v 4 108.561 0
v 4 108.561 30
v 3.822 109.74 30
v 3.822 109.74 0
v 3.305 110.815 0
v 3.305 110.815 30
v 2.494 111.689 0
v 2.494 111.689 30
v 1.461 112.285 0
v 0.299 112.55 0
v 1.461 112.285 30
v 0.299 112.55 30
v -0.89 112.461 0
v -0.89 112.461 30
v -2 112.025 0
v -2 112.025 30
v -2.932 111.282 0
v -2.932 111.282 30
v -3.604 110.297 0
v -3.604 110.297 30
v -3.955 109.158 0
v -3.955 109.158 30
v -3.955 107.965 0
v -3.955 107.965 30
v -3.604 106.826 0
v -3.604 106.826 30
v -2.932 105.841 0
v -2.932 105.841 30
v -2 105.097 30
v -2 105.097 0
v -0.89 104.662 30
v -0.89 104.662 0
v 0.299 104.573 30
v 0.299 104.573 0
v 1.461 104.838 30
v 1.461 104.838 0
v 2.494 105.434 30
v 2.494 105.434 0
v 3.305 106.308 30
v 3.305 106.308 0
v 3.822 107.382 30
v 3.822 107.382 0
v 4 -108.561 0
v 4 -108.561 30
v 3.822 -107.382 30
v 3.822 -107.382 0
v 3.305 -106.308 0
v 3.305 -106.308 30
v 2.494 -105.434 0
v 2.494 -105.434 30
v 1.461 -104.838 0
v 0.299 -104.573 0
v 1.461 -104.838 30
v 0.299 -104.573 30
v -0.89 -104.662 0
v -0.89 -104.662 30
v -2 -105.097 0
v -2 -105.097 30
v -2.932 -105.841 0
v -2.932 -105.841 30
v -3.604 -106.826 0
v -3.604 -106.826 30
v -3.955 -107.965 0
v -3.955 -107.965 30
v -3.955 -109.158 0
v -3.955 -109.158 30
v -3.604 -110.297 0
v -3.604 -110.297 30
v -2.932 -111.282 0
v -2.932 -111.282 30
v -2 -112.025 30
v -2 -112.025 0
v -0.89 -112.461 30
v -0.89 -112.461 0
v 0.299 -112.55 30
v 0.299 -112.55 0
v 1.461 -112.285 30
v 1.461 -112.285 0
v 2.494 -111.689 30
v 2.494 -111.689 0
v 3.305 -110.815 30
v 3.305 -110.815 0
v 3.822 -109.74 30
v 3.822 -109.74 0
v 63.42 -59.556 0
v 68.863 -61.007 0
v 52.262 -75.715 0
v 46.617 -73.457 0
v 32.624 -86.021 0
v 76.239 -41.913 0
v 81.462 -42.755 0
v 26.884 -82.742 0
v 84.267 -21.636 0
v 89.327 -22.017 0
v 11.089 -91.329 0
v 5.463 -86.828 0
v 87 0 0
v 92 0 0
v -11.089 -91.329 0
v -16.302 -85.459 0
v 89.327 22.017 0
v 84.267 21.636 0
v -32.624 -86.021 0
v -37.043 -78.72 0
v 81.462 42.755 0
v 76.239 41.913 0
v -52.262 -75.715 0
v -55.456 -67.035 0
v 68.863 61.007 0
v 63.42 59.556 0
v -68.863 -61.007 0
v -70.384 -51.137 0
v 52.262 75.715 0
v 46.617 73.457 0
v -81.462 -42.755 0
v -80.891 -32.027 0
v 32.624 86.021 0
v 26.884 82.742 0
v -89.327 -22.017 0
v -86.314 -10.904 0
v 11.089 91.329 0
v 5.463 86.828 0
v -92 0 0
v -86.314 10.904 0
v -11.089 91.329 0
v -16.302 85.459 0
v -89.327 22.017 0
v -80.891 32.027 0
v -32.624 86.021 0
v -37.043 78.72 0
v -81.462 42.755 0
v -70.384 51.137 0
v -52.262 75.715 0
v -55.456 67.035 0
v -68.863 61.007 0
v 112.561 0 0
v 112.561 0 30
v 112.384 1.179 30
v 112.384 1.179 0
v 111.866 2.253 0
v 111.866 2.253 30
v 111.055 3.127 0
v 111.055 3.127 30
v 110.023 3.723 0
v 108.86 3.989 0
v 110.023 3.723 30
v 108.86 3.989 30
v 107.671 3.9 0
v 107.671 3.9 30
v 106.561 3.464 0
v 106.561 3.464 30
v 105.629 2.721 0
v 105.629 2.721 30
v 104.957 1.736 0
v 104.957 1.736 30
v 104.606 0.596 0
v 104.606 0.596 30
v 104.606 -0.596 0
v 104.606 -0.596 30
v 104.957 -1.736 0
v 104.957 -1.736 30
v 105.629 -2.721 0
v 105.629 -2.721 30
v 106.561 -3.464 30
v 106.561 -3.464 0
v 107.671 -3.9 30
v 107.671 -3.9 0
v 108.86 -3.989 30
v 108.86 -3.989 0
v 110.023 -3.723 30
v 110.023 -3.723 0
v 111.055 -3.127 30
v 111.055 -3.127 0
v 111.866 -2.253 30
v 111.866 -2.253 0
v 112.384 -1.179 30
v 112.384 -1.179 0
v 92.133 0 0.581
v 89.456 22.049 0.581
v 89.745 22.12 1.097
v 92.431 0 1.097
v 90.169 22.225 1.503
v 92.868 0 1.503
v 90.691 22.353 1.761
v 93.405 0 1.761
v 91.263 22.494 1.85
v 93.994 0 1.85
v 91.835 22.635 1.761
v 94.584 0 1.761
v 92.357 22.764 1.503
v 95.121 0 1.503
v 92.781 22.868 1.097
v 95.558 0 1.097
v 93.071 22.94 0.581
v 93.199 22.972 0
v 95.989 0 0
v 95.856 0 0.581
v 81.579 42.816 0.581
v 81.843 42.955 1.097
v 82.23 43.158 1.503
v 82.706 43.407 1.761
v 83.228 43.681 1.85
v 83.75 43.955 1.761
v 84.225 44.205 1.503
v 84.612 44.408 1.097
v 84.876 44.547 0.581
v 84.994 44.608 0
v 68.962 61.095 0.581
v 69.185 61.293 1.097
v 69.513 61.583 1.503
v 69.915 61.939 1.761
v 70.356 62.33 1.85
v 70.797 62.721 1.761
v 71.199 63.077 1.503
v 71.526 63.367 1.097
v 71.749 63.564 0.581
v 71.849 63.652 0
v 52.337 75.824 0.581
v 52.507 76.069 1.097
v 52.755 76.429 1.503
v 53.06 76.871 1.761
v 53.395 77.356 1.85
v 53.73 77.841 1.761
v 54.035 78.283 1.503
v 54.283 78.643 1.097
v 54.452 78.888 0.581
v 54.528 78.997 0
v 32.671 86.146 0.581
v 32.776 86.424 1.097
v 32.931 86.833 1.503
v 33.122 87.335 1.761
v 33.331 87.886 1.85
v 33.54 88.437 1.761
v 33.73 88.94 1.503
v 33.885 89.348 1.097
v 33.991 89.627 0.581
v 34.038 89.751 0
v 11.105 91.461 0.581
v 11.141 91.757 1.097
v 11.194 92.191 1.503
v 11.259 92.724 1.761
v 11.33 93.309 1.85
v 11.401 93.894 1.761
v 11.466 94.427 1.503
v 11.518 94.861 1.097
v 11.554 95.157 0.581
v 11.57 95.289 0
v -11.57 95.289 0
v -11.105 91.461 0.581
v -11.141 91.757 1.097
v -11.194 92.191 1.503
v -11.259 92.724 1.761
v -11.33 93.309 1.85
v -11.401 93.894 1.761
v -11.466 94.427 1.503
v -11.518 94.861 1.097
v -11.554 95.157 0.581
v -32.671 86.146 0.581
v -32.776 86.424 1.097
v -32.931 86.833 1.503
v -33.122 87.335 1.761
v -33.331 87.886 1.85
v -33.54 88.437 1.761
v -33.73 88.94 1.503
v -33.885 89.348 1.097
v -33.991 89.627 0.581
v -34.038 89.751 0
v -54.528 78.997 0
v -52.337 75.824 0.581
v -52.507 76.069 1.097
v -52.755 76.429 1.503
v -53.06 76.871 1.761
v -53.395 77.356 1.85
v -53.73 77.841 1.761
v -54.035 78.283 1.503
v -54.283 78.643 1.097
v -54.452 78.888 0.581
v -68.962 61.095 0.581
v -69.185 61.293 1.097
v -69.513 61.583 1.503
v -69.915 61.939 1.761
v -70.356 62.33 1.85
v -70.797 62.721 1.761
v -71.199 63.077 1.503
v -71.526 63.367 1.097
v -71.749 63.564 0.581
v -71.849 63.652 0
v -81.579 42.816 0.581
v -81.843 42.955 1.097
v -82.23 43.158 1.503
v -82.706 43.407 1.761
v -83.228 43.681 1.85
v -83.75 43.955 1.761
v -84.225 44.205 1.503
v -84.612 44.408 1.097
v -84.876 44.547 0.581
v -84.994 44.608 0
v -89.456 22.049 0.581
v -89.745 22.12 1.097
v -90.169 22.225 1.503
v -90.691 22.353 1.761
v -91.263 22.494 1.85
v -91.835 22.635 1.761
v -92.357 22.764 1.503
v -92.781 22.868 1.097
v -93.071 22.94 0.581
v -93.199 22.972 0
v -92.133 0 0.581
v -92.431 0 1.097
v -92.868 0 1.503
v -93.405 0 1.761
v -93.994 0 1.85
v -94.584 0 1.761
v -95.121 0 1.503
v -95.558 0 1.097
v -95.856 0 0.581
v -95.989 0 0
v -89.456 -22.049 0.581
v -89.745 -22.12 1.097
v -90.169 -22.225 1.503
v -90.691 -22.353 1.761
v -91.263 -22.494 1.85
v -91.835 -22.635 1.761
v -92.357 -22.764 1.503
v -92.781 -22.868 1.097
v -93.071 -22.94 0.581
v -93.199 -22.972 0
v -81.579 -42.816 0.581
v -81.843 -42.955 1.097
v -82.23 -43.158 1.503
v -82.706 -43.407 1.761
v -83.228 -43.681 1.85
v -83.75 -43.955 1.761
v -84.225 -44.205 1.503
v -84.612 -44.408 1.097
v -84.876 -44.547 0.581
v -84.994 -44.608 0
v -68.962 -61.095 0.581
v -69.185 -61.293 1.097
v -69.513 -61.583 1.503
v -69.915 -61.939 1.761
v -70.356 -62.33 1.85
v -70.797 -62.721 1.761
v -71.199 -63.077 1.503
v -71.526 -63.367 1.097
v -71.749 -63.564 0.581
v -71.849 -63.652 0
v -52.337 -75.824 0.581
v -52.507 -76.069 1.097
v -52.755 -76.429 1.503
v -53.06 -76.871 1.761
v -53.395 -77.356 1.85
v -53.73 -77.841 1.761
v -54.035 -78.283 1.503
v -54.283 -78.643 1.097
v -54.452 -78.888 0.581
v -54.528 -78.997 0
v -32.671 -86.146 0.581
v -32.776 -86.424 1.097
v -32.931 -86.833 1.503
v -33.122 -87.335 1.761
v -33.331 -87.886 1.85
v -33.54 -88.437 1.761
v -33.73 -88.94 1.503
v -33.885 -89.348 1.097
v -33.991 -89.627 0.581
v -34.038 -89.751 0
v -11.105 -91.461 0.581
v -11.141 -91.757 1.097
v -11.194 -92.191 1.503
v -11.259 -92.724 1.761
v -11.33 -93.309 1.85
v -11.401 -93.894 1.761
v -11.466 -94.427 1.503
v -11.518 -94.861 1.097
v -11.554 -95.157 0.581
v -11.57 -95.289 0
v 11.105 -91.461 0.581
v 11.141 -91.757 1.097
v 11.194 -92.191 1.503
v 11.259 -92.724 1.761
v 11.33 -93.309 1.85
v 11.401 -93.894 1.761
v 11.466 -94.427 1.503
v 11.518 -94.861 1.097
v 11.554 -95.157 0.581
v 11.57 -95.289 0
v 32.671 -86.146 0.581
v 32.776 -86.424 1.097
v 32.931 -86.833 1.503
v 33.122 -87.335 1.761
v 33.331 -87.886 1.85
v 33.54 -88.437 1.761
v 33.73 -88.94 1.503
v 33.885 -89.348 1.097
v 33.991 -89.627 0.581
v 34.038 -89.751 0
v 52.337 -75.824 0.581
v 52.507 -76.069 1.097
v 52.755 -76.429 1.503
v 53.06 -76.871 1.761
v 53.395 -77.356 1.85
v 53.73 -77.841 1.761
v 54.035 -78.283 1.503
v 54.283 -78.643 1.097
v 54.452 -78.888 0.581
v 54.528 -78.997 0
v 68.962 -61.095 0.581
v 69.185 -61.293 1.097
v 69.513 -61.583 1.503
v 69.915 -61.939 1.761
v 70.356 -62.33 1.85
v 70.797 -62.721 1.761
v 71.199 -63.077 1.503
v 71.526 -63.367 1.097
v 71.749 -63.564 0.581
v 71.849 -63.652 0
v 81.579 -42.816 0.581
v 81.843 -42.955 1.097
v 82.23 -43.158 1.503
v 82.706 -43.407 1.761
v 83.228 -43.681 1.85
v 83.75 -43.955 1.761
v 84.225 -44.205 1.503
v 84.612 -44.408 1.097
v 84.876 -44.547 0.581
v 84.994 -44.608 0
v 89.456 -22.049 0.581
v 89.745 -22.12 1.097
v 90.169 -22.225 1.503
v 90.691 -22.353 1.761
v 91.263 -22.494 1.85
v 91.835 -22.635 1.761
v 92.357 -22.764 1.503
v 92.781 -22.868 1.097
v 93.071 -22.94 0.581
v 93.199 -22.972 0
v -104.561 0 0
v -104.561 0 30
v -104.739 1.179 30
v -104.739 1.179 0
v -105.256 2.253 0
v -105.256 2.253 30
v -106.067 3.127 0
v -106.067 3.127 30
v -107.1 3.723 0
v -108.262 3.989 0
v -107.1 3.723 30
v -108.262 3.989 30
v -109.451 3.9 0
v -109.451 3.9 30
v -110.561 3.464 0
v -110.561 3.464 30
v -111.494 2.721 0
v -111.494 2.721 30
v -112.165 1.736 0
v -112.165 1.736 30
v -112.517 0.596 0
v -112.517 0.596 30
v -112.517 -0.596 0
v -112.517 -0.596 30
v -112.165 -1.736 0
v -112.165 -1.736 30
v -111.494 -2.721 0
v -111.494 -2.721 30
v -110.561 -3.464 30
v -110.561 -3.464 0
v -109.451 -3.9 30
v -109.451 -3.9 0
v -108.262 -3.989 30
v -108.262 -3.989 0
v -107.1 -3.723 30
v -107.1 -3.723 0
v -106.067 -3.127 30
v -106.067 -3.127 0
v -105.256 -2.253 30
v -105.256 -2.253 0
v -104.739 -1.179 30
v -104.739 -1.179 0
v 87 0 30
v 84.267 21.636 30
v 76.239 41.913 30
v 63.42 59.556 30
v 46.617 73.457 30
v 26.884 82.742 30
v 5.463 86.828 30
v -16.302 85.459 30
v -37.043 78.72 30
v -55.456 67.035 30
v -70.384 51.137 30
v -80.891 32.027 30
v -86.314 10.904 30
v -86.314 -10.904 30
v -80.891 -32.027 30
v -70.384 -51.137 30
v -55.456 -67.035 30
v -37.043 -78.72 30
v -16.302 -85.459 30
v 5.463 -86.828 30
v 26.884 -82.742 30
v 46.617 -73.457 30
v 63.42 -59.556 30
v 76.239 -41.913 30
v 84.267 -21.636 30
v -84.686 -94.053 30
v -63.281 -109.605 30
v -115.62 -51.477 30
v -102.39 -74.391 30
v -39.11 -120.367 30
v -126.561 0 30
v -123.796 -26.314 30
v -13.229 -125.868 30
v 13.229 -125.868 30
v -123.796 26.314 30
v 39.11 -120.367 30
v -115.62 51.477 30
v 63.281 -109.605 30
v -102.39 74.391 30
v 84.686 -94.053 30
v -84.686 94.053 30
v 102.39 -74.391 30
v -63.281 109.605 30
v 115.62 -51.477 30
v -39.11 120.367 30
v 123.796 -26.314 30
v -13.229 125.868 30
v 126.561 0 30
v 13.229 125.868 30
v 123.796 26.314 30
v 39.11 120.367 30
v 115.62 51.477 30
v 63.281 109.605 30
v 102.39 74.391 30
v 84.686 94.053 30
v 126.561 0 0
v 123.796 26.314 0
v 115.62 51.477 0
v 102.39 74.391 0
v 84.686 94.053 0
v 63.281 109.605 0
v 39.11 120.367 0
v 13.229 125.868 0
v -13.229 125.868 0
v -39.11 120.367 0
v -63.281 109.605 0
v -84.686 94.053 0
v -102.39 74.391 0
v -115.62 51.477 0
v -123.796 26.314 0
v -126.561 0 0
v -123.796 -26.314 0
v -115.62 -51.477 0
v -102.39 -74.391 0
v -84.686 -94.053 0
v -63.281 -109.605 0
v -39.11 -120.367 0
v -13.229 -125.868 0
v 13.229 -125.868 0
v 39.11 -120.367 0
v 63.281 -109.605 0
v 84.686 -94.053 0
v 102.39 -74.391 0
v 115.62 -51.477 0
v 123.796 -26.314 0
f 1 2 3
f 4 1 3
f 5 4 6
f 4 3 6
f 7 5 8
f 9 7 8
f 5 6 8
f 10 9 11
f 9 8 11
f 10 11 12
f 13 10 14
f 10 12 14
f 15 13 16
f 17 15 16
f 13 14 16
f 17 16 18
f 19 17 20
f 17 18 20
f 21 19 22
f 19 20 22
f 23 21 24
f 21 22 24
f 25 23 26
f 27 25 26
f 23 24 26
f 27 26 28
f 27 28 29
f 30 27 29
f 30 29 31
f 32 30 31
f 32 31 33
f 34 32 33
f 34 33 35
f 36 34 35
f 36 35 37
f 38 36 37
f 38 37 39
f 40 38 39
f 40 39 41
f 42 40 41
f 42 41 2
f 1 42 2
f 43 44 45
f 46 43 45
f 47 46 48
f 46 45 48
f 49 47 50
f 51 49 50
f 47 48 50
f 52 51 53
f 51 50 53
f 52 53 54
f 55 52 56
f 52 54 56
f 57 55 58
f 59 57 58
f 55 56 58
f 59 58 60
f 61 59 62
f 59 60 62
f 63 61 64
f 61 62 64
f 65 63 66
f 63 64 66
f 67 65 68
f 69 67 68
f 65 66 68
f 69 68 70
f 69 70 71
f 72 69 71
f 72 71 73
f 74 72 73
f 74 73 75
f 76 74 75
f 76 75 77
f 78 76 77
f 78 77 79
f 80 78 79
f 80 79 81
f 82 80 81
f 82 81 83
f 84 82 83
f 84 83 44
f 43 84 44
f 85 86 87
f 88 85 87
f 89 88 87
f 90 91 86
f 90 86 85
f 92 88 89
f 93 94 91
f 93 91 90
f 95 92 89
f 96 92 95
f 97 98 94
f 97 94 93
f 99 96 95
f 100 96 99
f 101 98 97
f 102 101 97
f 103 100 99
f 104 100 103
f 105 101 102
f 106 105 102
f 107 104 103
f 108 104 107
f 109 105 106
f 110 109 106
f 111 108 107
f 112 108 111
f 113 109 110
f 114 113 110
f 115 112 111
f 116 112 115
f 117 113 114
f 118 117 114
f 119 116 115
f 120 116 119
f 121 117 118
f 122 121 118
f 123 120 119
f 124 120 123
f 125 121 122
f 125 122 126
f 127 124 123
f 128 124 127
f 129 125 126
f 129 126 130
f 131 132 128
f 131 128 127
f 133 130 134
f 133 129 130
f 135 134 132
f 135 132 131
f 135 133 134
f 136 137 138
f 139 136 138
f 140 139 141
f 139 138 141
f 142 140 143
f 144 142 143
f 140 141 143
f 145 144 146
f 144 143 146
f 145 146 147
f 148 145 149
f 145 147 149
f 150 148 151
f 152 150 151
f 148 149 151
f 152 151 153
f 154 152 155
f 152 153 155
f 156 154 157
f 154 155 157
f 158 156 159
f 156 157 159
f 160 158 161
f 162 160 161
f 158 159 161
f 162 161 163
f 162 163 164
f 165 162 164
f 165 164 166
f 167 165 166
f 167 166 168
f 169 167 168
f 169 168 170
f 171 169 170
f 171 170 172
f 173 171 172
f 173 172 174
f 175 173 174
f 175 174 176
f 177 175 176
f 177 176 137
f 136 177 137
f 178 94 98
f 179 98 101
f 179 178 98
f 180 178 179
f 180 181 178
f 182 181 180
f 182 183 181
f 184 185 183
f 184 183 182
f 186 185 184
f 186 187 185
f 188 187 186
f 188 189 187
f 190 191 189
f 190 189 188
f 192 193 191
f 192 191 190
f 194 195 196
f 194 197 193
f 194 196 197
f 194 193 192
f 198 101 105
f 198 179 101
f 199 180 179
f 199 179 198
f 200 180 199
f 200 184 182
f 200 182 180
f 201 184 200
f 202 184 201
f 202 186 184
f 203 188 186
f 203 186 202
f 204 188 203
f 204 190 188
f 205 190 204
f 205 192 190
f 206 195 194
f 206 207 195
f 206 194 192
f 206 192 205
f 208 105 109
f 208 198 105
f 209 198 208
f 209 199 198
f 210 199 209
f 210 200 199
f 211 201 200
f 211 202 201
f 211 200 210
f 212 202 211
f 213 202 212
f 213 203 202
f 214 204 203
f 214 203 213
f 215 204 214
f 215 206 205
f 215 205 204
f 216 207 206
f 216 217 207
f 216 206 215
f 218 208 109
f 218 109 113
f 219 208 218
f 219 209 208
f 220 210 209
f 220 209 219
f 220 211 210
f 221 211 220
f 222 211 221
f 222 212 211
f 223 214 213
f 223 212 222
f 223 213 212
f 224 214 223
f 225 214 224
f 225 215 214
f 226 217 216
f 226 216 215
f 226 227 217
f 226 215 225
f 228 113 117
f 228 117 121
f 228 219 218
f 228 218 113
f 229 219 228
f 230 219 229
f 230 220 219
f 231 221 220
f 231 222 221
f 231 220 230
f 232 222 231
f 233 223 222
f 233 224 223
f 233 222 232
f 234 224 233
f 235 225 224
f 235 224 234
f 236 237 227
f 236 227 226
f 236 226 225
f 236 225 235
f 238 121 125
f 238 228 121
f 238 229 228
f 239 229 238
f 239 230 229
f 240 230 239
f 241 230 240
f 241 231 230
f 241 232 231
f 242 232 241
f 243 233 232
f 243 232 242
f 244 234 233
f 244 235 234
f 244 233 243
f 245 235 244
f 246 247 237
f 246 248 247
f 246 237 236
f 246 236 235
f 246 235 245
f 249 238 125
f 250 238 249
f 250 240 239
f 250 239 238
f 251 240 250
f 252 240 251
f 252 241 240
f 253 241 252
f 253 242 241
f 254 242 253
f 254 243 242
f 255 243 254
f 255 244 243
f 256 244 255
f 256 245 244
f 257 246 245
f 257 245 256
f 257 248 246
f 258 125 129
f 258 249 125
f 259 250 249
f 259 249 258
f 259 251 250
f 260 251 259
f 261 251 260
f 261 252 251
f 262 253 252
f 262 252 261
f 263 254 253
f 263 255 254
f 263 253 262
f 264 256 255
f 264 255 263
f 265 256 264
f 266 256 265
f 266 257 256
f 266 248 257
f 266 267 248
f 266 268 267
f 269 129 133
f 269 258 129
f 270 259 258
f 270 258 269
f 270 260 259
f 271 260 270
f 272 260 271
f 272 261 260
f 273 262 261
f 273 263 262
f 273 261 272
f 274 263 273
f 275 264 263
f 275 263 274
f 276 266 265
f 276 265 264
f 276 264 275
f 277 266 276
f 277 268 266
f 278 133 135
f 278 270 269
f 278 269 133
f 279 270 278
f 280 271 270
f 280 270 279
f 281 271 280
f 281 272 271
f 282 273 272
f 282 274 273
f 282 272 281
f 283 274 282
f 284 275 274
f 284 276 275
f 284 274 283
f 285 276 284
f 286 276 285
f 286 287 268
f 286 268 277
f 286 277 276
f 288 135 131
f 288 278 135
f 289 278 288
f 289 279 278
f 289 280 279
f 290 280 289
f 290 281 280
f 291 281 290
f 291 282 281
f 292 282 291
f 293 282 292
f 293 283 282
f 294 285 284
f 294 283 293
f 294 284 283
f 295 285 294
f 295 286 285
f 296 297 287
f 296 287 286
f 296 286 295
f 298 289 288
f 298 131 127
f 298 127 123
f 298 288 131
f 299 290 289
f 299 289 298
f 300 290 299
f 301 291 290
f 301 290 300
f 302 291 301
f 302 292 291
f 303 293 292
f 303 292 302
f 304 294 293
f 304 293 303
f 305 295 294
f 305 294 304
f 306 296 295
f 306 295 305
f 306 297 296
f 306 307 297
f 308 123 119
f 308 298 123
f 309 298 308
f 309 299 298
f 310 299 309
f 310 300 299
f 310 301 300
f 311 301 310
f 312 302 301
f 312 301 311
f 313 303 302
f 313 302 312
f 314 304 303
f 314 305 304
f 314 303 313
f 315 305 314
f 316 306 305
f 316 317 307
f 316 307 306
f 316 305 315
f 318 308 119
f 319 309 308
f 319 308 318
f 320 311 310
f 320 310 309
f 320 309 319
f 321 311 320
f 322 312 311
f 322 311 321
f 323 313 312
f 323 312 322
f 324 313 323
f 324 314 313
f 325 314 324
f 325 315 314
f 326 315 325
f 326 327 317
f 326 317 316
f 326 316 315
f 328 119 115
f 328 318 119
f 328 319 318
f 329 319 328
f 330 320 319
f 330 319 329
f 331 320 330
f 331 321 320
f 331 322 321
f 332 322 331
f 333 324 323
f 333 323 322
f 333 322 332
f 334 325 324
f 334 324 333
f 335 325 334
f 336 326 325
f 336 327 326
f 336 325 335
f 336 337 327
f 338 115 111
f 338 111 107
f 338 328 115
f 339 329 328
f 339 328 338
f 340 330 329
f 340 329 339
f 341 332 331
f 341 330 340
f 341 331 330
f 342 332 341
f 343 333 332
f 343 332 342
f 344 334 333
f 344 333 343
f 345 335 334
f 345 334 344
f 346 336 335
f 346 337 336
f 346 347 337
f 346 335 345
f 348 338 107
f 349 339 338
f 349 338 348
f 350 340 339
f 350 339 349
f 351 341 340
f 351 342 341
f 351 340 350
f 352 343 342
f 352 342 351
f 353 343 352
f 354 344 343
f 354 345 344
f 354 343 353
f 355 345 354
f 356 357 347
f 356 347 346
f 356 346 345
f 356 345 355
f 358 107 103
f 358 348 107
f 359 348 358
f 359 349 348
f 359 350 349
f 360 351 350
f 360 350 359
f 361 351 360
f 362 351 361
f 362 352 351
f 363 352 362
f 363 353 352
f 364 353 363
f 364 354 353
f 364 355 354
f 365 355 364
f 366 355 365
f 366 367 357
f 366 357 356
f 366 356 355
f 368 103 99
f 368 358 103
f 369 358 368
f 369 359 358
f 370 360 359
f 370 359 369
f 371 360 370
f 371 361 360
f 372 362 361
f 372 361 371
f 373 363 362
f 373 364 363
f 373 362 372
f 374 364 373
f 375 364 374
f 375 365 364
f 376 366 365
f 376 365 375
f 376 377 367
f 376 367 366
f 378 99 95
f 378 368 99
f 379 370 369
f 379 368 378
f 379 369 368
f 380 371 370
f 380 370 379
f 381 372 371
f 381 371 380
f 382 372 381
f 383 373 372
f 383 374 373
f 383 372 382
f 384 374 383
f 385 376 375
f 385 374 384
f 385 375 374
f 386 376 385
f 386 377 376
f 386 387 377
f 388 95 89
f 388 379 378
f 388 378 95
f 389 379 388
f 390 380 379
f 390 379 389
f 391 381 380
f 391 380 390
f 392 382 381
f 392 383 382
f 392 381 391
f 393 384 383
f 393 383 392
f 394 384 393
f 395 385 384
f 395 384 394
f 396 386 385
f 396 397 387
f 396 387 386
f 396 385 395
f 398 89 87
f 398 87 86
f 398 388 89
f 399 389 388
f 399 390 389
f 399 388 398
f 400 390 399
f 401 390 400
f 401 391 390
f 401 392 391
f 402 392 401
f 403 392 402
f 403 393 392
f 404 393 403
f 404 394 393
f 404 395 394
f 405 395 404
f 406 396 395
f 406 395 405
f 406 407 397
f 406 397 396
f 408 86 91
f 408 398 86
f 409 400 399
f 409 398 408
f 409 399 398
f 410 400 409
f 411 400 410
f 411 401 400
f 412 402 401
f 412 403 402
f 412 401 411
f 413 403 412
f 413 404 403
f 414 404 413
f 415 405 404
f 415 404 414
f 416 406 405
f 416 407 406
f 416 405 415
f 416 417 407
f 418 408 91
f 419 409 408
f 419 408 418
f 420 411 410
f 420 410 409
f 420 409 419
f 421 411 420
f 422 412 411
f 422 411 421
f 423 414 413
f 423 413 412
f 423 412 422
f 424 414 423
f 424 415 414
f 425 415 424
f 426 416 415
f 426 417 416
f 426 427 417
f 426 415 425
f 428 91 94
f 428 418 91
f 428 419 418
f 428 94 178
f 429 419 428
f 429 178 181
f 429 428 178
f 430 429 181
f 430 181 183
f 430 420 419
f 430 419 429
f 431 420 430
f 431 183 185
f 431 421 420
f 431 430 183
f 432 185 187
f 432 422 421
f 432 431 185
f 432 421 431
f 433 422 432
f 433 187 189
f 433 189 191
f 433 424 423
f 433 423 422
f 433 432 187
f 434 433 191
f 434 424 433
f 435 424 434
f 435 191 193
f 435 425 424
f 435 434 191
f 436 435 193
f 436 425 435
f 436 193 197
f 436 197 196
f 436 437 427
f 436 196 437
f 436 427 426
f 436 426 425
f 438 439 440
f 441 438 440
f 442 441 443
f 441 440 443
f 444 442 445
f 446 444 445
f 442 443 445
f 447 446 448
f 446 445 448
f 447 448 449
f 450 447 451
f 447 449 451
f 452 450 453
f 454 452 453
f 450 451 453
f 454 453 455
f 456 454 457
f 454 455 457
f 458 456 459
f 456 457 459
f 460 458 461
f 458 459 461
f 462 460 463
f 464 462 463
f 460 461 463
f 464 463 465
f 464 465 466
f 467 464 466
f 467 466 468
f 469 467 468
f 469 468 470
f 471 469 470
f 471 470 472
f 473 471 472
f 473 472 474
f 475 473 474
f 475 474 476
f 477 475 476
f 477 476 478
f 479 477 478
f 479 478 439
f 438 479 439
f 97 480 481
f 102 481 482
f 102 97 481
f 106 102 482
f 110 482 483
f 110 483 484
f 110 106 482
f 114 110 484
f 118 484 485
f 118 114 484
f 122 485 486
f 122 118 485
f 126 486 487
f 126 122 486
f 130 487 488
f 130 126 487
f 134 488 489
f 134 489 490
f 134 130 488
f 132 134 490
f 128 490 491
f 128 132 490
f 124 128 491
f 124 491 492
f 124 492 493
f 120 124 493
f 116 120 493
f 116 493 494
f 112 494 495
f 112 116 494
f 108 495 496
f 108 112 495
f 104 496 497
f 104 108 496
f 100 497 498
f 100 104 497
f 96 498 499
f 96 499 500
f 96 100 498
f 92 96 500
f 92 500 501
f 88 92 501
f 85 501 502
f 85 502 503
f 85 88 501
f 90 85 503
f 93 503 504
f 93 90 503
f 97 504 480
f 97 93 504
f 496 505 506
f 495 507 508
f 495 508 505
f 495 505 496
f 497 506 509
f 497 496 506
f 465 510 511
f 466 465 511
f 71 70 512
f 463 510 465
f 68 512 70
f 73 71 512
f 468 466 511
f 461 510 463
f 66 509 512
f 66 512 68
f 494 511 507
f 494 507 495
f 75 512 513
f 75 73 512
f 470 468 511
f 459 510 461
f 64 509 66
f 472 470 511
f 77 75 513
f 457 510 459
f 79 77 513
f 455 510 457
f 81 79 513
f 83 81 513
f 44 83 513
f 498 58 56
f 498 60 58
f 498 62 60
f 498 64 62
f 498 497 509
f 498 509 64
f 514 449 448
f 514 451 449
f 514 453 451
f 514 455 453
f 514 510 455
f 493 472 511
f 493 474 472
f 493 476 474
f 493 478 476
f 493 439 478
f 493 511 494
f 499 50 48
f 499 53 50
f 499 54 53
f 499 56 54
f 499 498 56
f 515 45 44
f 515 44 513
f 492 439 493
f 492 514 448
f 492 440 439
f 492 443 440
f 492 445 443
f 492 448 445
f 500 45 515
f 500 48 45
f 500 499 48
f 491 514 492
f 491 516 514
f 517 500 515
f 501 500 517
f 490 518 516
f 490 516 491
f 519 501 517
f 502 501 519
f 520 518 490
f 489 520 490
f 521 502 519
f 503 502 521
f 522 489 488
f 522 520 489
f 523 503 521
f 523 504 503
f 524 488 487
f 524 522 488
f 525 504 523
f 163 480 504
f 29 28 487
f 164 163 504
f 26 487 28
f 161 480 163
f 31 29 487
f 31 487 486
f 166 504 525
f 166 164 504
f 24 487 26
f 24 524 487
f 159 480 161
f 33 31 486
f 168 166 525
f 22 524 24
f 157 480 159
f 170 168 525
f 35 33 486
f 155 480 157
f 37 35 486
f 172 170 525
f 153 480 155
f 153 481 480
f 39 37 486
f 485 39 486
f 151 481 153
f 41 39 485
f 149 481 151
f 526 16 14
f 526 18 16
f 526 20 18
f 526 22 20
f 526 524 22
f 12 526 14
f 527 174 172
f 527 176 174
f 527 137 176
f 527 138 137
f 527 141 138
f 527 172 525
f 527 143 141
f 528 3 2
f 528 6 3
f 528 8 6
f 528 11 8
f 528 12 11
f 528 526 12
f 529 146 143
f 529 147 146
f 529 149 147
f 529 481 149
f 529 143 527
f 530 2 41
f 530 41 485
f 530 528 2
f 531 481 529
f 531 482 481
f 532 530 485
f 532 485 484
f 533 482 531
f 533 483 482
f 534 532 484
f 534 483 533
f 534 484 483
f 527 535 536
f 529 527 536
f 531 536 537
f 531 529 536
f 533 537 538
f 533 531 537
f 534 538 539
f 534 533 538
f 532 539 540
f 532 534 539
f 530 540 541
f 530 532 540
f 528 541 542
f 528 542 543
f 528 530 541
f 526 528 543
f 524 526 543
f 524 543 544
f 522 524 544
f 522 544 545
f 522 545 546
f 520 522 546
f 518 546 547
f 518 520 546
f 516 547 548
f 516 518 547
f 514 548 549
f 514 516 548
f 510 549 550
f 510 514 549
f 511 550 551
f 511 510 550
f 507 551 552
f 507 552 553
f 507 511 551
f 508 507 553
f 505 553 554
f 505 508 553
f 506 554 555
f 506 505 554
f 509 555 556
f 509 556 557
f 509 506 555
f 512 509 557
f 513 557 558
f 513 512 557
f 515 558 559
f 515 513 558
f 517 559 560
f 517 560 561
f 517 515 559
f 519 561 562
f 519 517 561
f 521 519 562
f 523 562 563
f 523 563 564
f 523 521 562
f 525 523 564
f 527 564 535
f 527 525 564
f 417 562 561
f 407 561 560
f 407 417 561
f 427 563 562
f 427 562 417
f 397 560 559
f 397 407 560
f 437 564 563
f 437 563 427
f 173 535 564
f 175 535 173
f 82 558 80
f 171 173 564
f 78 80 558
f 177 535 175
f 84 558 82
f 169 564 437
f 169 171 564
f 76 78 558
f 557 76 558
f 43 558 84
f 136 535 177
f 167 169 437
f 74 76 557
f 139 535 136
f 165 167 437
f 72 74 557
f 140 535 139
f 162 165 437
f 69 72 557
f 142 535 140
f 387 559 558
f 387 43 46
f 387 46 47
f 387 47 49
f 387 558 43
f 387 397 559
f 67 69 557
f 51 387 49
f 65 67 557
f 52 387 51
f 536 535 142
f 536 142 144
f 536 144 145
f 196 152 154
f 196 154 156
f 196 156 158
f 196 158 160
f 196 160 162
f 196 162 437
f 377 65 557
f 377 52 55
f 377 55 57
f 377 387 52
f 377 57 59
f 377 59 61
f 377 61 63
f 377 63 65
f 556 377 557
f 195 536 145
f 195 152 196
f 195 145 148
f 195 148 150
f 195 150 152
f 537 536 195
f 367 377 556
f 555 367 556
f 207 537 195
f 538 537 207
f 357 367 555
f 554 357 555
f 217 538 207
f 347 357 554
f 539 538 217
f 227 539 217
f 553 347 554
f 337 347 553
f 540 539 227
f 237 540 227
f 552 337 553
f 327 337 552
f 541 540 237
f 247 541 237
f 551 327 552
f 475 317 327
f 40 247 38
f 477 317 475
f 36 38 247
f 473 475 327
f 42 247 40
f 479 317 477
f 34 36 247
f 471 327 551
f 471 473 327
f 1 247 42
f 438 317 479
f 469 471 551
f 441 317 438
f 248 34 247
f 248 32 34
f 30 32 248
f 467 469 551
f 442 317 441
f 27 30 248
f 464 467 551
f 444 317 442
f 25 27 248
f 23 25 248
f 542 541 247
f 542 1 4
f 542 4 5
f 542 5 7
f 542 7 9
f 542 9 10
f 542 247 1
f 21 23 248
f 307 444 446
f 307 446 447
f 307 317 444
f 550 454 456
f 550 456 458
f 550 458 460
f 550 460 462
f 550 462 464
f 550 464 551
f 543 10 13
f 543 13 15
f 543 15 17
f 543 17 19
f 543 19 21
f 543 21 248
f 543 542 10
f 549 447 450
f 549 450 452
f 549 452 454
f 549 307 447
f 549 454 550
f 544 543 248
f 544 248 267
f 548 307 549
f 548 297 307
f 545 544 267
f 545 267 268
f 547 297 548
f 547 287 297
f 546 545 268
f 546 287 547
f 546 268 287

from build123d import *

# Parameters (mm, degrees)
F2_R     = 4
F3_DEPTH = 30.001


with BuildPart() as f1:
    # F0 (on Front) → F1 (revolve)
    with BuildSketch(Plane.XZ):
        with BuildLine():
            Line((87, 30), (87, 0))
            Line((87, 0), (92, 0))
            ThreePointArc((92, 0), (93.994377, 1.850134), (95.988754, 0))
            Line((95.988754, 0), (126.56137, 0))
            Line((126.56137, 0), (126.56137, 30))
            Line((126.56137, 30), (87, 30))
        make_face()
    revolve(axis=Axis((0, 0, 3.579337), (0, 0, 1)))

    # F2 (on face) → F3 (cut, through all)
    with BuildSketch(Plane.XY.offset(30)):
        with Locations((108.56137, 0)):
            Circle(F2_R)
        with Locations((0, 108.56137)):
            Circle(F2_R)
        with Locations((-108.56137, 0)):
            Circle(F2_R)
        with Locations((0, -108.56137)):
            Circle(F2_R)
    extrude(amount=-F3_DEPTH, mode=Mode.SUBTRACT)


solid = f1.part
